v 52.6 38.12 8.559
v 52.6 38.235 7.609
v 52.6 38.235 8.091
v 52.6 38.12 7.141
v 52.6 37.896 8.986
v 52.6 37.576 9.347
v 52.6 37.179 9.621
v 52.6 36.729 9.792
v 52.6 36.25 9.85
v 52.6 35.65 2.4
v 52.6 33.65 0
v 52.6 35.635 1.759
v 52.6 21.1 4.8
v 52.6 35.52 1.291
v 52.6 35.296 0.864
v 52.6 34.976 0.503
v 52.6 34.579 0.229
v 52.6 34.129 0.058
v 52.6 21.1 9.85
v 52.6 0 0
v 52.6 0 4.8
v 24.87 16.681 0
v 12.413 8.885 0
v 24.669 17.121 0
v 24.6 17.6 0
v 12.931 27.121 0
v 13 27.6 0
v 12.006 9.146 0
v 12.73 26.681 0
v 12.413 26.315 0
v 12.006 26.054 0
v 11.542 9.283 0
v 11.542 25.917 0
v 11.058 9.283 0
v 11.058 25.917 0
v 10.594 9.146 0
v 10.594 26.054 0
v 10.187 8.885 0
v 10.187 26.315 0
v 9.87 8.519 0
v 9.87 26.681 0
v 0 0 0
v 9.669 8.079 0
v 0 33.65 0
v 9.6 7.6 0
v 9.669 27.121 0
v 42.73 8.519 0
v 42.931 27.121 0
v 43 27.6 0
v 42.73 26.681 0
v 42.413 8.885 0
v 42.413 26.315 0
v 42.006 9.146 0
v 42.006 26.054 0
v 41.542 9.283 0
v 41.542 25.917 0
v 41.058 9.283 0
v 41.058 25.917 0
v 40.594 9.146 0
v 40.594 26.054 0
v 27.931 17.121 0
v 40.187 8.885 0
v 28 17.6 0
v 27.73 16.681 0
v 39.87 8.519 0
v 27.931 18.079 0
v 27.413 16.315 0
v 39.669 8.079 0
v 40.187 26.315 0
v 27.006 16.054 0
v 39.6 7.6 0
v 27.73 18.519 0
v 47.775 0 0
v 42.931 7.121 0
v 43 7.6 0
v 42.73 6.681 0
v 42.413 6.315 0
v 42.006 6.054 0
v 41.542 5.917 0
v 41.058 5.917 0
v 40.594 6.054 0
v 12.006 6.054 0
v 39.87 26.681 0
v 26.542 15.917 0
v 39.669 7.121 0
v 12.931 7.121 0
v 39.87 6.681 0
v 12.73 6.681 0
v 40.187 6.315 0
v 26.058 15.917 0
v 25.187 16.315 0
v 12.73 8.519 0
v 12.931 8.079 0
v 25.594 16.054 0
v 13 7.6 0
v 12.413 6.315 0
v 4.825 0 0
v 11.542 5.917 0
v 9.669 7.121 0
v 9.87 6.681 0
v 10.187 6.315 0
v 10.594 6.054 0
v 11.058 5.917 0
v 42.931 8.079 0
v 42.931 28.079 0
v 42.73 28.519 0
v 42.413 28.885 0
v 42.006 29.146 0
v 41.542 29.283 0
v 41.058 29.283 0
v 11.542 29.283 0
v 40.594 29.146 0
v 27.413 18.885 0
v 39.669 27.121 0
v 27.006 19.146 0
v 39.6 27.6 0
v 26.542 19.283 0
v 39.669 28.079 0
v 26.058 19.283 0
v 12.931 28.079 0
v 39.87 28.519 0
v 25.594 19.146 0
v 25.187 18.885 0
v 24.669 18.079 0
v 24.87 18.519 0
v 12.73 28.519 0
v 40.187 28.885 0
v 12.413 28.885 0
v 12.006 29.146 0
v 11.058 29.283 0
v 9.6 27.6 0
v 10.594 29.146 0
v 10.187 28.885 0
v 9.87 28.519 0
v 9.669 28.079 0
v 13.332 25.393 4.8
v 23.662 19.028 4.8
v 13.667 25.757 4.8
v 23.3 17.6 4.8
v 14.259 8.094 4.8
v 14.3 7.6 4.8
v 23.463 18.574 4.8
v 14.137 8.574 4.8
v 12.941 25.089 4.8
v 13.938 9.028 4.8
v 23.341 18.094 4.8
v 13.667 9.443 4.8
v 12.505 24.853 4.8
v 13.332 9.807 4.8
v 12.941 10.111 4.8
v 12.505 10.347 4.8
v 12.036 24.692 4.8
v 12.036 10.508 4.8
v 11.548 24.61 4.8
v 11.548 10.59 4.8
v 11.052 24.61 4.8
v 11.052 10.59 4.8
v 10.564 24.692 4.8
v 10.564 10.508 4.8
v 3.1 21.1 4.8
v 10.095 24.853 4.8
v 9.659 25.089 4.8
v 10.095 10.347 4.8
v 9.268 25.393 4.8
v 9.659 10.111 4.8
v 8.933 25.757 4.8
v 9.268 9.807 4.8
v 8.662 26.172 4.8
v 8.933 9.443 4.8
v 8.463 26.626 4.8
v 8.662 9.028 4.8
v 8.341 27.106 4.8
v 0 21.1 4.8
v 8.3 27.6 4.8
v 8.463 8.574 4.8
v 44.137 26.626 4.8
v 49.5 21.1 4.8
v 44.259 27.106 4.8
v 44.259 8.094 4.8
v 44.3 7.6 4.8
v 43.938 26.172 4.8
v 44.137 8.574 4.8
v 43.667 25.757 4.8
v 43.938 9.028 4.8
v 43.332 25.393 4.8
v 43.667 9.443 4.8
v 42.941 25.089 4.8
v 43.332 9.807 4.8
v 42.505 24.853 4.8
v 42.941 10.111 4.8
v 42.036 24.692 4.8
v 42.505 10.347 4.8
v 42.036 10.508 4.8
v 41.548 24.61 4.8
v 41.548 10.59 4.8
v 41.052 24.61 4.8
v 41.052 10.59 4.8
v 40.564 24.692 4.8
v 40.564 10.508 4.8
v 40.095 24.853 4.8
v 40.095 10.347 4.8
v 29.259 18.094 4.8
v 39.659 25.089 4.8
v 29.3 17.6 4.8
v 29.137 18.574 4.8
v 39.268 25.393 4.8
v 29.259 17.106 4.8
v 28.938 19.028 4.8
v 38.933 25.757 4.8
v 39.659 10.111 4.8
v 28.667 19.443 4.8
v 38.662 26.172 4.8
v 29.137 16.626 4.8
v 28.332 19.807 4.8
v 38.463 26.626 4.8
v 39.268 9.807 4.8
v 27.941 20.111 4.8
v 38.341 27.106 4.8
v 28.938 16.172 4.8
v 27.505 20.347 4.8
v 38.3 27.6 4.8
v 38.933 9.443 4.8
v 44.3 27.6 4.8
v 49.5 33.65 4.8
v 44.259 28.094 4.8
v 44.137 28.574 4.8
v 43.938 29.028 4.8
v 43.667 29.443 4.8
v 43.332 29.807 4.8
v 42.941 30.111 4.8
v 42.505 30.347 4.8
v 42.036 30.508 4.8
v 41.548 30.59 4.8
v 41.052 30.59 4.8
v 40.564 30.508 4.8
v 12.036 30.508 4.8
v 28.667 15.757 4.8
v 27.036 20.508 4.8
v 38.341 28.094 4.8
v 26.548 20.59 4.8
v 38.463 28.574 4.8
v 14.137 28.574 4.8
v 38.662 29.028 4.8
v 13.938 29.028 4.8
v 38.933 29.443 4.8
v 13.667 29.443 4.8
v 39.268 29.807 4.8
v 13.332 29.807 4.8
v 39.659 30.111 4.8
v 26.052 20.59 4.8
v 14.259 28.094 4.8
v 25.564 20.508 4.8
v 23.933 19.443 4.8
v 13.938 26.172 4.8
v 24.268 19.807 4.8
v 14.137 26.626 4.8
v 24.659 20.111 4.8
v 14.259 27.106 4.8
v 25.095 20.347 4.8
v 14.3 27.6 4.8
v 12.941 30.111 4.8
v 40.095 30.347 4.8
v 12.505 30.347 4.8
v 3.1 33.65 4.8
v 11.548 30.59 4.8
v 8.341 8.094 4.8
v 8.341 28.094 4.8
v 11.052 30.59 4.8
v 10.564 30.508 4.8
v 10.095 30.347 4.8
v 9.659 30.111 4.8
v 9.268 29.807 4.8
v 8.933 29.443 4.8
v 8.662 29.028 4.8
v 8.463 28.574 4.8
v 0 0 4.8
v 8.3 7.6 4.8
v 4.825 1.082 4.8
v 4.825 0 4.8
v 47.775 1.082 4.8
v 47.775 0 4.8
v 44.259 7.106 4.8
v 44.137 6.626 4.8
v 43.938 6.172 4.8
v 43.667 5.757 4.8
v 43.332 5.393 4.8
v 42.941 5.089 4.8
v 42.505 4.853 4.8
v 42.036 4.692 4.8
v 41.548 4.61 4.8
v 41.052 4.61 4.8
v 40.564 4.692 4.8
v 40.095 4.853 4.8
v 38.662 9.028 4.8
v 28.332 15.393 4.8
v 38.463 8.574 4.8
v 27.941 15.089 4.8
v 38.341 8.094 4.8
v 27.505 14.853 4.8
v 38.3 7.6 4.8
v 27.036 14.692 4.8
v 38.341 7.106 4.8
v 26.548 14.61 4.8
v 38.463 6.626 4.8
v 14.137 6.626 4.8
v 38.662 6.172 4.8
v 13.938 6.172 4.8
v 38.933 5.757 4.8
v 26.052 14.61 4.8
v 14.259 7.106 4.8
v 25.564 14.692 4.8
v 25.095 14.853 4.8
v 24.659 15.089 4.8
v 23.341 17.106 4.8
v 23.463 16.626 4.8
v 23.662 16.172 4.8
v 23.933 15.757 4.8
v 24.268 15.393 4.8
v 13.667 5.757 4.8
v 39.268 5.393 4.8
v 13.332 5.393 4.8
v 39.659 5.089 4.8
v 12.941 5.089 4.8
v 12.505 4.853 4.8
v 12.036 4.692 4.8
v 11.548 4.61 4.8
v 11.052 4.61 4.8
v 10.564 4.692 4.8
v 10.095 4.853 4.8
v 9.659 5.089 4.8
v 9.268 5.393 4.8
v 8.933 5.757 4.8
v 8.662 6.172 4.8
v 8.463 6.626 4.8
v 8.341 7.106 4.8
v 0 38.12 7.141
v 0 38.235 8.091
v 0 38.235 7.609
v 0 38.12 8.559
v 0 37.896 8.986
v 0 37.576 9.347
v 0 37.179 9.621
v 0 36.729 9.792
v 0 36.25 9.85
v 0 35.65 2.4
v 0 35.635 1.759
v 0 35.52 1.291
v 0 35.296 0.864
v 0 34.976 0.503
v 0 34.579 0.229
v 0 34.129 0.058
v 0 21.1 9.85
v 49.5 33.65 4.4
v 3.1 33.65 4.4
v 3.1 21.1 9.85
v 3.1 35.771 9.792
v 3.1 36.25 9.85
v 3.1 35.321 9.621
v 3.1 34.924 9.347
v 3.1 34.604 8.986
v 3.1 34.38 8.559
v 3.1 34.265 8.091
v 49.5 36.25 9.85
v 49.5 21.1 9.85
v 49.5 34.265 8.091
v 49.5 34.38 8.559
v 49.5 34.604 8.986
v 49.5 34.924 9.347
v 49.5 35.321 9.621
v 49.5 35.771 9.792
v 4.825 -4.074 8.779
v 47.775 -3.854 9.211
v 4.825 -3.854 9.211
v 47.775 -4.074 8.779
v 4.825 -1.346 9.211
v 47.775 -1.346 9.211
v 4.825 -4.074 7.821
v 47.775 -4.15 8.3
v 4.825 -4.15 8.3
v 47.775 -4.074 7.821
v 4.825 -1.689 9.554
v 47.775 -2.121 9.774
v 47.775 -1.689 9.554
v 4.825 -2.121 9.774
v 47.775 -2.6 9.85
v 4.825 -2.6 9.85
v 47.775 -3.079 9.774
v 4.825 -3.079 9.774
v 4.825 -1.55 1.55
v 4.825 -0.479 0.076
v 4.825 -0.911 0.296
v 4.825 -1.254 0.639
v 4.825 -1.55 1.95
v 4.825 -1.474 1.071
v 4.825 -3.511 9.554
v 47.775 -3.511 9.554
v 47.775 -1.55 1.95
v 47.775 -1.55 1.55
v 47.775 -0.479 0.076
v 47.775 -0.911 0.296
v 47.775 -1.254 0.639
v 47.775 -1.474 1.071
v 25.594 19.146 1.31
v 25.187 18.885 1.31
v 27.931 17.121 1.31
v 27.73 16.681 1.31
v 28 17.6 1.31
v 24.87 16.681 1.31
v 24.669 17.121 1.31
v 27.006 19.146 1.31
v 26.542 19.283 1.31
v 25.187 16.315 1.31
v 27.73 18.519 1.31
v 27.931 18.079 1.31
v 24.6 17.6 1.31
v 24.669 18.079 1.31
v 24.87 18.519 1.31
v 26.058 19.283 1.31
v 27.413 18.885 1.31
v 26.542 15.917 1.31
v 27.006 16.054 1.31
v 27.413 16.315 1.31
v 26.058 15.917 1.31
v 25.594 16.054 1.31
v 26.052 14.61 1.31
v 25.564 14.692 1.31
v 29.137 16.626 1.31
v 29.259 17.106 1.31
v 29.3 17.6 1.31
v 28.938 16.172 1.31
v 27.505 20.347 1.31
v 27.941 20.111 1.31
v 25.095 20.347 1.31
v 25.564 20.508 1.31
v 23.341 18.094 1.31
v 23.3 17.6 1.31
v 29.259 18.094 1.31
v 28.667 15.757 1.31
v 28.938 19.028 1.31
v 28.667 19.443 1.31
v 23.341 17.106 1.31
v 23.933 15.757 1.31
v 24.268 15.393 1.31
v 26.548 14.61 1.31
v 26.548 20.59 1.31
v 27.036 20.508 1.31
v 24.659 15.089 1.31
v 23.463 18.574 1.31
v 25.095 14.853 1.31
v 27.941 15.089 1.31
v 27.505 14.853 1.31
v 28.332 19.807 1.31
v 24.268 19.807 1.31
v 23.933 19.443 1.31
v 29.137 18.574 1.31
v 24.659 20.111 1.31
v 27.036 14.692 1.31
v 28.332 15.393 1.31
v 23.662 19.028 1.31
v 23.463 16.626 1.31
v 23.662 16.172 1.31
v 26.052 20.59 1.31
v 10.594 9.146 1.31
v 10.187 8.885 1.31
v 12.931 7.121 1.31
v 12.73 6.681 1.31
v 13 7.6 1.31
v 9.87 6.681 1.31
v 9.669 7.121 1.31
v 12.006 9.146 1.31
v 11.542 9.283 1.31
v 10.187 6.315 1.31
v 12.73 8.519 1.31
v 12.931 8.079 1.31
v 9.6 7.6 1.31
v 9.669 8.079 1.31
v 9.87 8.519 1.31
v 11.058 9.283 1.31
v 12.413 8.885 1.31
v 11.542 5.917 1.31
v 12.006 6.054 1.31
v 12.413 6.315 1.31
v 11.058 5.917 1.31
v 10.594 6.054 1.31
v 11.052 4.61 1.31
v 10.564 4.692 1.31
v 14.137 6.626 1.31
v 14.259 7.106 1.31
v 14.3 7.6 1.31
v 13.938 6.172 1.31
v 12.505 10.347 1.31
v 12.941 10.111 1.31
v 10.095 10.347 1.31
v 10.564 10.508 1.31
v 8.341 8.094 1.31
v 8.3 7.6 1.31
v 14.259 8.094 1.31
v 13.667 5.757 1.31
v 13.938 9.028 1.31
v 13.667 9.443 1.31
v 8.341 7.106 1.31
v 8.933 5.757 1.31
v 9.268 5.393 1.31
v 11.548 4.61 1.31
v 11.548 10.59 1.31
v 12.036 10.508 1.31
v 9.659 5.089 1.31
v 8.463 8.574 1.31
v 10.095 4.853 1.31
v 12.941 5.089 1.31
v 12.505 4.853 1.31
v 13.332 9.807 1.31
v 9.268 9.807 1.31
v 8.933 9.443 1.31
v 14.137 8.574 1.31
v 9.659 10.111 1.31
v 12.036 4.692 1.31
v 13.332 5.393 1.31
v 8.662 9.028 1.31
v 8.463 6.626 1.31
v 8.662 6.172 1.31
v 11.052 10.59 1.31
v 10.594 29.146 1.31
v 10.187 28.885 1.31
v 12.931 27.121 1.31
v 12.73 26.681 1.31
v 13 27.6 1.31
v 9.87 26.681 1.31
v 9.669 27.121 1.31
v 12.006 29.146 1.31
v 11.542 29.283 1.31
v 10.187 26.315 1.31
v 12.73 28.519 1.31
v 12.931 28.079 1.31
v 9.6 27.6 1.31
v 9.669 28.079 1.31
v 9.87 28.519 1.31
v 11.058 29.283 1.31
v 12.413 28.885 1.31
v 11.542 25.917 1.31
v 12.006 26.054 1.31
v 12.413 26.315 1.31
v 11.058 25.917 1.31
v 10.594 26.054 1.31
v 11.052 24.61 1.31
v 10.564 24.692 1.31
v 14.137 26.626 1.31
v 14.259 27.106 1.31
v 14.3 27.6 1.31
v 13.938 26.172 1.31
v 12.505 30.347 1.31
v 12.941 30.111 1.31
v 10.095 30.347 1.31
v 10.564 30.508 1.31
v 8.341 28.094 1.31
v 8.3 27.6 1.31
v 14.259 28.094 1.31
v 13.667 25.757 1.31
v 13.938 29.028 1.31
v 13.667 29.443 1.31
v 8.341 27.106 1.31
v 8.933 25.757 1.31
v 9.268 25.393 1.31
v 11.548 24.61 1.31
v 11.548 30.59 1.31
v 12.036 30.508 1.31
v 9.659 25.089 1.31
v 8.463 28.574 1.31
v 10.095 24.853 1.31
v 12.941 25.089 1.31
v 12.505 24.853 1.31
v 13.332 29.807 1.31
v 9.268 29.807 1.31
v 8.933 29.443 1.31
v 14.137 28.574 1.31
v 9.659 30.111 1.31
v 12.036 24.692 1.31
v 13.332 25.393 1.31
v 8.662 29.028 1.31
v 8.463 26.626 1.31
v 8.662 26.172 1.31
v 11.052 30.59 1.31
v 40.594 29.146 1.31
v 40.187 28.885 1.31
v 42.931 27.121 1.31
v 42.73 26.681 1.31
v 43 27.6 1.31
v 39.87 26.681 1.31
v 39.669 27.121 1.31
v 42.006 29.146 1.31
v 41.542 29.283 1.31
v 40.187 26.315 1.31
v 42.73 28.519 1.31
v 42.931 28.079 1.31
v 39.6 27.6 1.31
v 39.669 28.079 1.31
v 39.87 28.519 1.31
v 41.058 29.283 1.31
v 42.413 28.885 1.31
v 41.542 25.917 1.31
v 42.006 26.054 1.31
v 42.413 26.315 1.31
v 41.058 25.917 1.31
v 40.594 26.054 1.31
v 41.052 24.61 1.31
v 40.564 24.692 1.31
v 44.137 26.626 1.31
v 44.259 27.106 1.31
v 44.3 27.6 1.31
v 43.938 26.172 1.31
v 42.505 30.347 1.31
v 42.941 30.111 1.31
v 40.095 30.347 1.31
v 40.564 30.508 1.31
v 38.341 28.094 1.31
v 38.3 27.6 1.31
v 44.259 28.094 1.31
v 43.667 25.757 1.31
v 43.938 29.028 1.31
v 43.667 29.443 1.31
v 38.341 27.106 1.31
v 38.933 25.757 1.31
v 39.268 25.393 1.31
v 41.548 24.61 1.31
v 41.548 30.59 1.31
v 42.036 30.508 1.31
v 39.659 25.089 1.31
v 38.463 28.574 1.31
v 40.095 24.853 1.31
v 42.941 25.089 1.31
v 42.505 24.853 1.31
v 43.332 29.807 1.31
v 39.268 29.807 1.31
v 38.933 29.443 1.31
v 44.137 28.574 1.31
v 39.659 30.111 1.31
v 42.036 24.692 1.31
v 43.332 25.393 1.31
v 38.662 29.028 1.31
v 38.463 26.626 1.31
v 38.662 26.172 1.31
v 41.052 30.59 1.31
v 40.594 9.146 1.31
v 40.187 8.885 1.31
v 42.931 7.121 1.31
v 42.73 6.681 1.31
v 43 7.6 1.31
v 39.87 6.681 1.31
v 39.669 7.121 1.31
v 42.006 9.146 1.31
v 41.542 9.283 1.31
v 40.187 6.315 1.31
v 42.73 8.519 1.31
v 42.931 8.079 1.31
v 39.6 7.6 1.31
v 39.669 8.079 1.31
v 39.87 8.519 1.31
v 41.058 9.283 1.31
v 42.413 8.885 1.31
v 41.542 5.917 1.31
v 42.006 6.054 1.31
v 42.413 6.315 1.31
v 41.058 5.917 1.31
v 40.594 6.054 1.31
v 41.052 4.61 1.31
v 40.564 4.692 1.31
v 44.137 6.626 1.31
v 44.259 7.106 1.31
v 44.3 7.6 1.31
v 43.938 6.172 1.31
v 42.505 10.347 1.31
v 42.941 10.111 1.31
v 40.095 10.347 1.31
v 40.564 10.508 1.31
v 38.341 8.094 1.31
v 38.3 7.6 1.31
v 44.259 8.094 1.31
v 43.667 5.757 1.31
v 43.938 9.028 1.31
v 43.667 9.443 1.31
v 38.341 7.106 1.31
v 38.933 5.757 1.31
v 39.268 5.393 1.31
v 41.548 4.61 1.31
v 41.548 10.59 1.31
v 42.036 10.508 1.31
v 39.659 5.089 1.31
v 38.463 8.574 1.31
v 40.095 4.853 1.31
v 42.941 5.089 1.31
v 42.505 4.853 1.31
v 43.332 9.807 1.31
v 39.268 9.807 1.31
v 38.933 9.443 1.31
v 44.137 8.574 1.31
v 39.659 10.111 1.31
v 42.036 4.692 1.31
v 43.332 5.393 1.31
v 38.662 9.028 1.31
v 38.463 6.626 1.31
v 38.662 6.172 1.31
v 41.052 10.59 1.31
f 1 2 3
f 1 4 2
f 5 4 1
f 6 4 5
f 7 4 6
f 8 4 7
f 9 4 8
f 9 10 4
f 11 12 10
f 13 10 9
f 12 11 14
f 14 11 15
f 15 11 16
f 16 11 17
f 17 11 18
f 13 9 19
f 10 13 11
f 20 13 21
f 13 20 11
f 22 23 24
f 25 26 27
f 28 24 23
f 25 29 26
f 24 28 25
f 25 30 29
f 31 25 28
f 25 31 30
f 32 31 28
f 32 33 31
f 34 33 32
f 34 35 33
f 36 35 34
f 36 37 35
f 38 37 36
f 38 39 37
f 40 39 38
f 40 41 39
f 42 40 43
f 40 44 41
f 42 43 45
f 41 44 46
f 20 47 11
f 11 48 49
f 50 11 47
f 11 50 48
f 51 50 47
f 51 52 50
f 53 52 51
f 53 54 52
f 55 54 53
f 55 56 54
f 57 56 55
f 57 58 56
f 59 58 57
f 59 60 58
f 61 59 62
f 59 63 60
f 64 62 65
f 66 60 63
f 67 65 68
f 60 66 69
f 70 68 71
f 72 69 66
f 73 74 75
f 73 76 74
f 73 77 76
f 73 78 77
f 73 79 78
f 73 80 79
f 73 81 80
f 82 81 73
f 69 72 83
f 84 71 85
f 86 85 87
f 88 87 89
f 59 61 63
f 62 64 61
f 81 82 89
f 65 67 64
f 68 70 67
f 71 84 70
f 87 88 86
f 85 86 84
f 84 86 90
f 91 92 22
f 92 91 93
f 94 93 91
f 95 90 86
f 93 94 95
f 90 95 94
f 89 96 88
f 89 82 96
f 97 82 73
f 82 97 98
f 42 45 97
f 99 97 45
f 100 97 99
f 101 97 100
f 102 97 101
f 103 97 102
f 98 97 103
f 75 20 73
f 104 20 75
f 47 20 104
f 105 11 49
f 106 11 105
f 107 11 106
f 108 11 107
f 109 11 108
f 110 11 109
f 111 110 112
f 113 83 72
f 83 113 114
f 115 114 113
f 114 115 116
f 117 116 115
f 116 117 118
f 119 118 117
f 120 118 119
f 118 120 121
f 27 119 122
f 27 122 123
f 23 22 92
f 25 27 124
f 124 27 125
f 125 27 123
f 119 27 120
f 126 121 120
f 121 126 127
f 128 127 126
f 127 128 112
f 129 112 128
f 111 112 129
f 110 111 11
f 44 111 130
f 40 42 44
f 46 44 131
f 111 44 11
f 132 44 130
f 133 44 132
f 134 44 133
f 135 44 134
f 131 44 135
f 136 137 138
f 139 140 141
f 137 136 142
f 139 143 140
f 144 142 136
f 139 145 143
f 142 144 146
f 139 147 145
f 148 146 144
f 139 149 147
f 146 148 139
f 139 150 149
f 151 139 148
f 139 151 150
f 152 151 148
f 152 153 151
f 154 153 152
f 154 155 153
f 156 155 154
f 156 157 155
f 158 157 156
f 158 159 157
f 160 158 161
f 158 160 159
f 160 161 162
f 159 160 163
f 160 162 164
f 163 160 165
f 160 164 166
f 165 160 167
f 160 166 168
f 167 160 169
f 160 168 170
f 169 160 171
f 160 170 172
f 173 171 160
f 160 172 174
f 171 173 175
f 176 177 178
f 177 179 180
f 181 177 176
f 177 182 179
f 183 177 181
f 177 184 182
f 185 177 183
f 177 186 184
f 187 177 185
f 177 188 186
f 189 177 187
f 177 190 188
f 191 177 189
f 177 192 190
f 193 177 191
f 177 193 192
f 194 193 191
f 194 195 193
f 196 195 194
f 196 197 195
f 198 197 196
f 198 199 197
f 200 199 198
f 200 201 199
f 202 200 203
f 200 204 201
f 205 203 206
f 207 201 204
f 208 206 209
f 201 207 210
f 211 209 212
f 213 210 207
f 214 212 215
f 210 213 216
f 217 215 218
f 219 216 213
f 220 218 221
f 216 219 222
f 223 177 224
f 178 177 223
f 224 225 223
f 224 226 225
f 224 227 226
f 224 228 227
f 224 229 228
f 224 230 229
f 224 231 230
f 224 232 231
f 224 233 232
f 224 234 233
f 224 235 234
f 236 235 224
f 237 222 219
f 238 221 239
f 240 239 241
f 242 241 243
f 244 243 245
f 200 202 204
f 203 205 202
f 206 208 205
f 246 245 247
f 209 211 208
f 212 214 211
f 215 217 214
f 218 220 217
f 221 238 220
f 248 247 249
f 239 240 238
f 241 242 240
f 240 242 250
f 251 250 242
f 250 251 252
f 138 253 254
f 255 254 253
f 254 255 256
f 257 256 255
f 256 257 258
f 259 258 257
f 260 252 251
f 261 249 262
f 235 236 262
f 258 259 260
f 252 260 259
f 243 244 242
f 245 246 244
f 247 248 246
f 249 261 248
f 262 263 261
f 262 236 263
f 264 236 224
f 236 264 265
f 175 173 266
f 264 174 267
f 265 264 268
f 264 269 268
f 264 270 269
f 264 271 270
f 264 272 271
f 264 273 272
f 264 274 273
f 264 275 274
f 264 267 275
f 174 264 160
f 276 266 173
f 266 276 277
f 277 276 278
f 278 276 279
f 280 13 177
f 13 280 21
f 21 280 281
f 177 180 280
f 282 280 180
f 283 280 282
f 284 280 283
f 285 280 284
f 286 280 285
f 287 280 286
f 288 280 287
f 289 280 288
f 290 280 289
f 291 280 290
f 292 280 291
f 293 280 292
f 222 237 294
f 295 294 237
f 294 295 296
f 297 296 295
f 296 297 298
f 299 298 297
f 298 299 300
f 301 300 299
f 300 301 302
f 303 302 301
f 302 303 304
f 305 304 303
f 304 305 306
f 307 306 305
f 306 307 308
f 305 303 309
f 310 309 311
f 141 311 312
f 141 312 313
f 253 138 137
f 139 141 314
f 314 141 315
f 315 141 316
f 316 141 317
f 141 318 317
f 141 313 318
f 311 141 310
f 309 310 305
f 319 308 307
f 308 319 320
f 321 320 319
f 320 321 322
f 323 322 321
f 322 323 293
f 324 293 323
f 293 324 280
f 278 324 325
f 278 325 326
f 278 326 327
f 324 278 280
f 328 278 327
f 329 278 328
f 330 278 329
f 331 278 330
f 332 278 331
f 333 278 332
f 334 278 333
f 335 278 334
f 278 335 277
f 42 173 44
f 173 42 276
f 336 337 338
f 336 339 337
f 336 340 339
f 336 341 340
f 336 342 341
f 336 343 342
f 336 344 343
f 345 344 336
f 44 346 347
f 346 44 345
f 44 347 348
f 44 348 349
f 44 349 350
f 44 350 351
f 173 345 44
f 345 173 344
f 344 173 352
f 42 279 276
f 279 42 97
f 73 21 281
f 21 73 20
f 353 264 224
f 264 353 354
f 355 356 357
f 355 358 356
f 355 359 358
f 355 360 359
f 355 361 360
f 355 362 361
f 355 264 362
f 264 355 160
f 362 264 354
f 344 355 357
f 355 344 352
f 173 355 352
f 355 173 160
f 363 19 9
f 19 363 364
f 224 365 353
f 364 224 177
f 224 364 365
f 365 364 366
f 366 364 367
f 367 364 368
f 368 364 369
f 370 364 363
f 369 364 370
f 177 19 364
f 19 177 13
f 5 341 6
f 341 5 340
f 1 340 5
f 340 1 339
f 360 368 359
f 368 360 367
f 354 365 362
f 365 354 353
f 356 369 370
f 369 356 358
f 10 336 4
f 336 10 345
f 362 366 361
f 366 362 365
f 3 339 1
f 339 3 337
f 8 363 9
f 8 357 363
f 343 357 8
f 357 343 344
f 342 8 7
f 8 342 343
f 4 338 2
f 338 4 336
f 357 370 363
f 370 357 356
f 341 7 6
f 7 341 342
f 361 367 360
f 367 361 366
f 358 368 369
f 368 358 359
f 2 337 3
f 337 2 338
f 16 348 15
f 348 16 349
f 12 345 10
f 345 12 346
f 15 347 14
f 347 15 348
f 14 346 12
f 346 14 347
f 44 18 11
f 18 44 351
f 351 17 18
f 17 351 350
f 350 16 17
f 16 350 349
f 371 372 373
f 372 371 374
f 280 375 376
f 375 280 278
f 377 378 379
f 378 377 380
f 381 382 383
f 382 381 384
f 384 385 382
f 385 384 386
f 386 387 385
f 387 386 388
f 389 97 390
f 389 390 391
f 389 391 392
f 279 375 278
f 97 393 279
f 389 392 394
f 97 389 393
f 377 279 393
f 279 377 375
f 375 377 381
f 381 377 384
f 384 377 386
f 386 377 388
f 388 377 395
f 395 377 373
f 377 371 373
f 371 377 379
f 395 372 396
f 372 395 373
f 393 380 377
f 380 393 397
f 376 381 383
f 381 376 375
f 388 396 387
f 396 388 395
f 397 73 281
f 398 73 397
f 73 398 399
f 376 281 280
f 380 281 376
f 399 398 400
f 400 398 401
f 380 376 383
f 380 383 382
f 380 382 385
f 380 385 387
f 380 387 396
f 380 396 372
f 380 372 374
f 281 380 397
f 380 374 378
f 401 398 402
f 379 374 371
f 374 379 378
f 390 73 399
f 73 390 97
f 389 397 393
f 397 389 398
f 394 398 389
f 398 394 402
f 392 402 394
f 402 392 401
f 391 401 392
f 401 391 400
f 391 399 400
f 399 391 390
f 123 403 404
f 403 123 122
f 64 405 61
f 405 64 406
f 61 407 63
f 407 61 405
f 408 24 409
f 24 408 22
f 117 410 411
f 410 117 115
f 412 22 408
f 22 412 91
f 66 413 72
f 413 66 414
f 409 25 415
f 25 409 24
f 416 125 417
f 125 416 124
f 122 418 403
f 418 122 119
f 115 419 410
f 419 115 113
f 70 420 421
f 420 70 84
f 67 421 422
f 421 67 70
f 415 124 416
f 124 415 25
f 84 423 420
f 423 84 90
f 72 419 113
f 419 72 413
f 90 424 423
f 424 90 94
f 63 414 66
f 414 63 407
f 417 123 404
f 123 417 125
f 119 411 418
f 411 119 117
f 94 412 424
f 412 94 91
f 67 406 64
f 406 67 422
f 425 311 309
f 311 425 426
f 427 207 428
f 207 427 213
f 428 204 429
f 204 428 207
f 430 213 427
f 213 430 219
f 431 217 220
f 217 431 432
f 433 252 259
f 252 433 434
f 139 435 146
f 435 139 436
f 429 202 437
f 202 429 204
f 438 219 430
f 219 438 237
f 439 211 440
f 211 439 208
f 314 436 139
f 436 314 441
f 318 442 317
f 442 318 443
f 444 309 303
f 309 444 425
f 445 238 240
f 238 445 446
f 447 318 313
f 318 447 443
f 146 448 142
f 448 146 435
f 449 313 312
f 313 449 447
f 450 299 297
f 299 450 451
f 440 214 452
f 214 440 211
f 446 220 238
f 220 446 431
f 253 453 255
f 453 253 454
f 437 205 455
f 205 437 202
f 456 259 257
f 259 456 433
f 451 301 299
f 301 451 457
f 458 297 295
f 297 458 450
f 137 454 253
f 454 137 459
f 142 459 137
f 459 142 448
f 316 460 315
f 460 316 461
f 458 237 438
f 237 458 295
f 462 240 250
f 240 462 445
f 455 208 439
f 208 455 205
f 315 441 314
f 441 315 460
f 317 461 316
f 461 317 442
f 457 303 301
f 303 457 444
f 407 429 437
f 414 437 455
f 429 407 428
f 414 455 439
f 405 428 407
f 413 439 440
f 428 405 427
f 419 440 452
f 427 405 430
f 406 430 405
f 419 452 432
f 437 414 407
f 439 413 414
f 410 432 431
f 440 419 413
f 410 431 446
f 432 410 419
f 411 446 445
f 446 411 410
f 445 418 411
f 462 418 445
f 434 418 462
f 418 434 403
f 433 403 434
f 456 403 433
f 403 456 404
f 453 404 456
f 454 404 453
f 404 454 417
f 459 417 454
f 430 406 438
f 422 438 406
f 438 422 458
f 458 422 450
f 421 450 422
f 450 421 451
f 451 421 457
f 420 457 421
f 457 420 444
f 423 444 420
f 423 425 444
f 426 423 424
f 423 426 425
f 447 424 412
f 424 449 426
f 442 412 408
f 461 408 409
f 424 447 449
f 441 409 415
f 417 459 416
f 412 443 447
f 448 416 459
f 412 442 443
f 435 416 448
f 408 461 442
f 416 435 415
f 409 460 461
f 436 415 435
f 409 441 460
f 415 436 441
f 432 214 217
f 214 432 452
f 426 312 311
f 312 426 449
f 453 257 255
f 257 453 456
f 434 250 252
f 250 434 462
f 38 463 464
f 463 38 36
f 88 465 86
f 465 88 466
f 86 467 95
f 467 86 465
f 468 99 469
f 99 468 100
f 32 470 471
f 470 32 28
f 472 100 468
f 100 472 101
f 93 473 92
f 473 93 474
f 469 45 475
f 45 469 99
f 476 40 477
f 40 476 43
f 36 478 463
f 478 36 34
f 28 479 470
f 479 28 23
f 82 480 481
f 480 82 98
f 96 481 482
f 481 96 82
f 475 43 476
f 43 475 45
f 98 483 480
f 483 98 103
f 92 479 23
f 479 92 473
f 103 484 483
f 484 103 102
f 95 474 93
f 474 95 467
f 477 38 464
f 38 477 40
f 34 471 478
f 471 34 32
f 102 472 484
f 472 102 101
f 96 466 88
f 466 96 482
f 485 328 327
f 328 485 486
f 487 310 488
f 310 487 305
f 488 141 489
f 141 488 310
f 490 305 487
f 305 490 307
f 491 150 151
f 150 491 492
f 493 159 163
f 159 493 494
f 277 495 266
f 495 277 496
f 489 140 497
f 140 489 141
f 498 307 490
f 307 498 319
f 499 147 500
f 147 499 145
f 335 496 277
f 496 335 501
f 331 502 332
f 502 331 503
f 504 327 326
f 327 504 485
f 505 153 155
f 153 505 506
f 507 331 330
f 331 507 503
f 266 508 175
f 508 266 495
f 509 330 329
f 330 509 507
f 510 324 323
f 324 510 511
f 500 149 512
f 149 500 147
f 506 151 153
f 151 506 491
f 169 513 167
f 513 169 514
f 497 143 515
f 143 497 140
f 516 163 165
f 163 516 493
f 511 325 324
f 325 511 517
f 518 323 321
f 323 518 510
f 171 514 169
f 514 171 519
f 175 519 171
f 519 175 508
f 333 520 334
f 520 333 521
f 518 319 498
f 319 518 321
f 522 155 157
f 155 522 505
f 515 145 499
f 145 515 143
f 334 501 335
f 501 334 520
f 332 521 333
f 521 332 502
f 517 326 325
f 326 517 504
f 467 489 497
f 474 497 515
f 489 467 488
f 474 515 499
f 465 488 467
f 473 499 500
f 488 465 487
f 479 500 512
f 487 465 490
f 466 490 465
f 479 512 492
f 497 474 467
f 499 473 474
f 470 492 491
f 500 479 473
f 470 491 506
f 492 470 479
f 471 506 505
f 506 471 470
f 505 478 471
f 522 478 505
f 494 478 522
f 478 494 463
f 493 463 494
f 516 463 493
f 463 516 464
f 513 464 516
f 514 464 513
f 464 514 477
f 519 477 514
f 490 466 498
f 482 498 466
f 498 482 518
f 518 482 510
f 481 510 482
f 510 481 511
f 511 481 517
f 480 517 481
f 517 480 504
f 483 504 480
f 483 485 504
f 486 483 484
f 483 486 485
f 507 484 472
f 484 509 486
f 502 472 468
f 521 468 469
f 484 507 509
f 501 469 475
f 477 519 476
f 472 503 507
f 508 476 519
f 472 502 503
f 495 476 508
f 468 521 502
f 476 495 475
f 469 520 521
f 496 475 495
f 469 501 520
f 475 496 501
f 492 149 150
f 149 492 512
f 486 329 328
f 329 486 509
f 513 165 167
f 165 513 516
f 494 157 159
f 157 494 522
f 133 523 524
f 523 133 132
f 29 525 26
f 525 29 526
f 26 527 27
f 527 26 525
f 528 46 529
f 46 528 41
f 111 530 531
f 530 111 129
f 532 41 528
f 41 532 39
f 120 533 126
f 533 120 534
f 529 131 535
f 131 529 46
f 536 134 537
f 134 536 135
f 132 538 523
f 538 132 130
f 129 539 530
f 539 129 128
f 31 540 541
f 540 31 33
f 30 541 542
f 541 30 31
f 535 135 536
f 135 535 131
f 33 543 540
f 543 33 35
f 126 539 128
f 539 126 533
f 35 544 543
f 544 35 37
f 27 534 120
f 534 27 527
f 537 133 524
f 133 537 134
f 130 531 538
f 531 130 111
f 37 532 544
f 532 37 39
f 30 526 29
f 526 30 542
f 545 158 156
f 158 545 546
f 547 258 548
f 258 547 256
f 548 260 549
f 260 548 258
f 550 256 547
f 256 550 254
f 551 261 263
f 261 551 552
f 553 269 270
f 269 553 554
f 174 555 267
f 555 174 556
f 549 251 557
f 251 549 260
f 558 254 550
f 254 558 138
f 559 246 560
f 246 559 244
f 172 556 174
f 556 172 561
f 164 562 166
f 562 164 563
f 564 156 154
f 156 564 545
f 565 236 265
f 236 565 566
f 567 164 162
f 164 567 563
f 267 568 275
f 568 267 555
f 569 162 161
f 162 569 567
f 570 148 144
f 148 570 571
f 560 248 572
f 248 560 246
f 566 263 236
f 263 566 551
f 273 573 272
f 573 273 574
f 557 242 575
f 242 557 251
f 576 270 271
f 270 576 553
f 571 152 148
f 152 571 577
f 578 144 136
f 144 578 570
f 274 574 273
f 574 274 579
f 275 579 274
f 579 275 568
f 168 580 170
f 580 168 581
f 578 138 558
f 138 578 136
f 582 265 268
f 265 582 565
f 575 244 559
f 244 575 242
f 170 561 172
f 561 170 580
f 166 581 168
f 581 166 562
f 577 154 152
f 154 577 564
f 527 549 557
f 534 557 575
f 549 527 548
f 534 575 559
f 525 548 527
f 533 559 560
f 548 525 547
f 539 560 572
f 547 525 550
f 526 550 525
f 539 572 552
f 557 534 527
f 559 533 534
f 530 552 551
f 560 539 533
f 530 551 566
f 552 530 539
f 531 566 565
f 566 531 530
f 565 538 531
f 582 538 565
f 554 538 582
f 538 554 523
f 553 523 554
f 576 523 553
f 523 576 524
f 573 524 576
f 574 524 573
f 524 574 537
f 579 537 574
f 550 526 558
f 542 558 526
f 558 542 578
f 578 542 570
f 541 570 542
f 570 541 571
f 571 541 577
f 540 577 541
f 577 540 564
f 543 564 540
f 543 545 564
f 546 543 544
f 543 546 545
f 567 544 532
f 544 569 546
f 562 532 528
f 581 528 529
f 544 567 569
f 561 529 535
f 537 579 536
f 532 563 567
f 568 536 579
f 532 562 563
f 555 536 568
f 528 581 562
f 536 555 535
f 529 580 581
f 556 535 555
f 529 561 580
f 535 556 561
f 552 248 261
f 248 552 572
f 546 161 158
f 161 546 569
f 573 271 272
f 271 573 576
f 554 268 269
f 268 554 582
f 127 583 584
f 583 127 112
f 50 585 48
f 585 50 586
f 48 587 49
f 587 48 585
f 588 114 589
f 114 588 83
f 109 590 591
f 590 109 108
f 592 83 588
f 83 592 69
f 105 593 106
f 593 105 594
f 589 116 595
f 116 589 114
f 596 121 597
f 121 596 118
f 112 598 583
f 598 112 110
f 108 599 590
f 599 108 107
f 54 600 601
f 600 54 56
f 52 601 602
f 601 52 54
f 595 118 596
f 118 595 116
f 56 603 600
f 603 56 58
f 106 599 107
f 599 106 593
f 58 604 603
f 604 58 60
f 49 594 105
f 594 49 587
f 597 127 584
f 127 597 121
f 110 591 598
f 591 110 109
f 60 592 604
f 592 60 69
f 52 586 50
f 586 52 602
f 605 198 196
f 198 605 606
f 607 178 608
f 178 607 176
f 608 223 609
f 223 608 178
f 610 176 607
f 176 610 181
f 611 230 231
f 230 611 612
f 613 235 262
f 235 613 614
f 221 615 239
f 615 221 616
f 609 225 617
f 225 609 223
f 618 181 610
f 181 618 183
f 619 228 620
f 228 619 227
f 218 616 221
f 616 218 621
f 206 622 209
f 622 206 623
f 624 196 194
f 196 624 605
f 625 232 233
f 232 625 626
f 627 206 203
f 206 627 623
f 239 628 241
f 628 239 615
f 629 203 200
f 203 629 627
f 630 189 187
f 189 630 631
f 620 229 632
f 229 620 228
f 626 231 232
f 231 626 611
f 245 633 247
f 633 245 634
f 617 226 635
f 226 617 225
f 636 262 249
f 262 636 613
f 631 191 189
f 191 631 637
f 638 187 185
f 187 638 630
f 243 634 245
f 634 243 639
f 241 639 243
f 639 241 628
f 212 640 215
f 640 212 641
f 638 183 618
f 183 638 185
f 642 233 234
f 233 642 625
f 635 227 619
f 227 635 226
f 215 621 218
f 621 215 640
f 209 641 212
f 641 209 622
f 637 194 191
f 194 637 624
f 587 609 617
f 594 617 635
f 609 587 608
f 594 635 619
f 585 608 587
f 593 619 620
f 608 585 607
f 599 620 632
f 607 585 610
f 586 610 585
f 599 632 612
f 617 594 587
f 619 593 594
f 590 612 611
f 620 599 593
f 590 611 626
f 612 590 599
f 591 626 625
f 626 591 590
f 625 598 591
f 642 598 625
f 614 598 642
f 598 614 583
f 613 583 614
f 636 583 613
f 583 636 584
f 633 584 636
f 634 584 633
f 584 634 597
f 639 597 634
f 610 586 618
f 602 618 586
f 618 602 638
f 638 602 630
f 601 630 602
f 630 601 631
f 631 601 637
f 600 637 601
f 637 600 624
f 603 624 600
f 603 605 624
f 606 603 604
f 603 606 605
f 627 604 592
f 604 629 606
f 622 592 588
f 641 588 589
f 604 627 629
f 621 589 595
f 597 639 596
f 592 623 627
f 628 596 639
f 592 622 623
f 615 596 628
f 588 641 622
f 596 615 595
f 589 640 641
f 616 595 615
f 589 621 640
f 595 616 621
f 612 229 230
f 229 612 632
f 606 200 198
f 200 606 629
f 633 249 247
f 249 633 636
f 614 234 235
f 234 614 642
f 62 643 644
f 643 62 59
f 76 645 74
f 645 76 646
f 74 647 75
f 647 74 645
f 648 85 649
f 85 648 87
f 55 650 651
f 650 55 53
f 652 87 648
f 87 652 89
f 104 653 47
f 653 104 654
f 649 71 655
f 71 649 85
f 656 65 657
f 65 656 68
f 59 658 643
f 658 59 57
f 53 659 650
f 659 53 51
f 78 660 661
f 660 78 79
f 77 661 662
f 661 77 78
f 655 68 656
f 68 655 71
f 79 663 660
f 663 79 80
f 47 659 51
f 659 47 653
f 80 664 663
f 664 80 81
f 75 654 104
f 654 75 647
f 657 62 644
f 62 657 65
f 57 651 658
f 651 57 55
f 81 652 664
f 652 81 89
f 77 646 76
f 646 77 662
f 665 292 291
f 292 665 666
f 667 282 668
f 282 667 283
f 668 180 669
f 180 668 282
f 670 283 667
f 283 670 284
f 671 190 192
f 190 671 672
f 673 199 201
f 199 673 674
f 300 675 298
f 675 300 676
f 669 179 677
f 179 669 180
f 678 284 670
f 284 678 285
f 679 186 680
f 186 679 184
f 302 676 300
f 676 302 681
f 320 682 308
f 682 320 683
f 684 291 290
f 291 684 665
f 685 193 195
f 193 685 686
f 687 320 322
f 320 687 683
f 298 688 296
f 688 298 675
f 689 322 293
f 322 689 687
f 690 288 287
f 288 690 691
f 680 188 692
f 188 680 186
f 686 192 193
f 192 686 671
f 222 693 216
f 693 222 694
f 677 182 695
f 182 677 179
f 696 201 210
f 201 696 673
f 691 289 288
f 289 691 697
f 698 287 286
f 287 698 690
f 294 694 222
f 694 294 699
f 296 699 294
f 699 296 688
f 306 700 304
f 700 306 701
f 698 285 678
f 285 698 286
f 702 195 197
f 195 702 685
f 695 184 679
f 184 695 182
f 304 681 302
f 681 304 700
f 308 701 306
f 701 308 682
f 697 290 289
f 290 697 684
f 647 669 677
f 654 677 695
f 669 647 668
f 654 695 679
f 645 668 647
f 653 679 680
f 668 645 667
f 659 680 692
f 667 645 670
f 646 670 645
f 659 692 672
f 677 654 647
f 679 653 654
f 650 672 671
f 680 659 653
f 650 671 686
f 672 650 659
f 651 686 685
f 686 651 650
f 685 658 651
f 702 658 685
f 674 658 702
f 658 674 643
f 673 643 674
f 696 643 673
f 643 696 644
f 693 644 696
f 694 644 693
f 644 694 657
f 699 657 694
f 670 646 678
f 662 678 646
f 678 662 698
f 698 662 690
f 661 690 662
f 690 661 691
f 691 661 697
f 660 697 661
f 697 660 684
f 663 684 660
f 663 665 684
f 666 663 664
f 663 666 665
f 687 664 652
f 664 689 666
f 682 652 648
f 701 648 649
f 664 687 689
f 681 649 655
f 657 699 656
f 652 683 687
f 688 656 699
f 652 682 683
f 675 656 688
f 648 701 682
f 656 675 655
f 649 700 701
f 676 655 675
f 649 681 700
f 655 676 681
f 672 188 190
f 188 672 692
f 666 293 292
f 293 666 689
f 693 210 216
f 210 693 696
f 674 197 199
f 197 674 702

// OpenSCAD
$fa=5; // default minimum facet angle is now 0.5°
$fs=0.5; // default minimum facet size is now 0.5 mm

//top plate
tpx = 52.6;
tpy = 47.6-5.2;
tpz = 6.3-1.5;

//base plate;
bpx = tpx;
bpy = tpy-5.2;// 42.4;
bpz = 9.85;

//front lip
flx = 42.95;
fly = 4.2;
flz = 5.1;
fd = 3.1;
flo = 2.4;

//back lip
blx = tpx;
bly = 16.7;
blz = bpz - tpz;

//backlip diameter
bd = 4;

//back lip z offset from top
blo = 2.4;

*union()
{
  cube([tpx,tpy,tpz]);
  translate([0,-(bpy-tpy)/2,0])
  cube([bpx,bpy,bpz]);
}

difference()
{
  translate([0,tpy-((tpy-bpy)/2)-fd/2,bpz])
    rotate([180,0,0])
      plate();
  
  translate([0,-1,0])
  {
    translate([bpx/2,bpy/2,0])
      r_screwhole();

    translate([bpx/2-15,bpy/2-10,0]) r_screwhole();
    translate([bpx/2-15,bpy/2+10,0]) r_screwhole();
    translate([bpx/2+15,bpy/2+10,0]) r_screwhole();
    translate([bpx/2+15,bpy/2-10,0]) r_screwhole();
  }
}

module plate()
{
  translate([0,(tpy-bpy)/2+bd/2,bpz-tpz])
    cube([bpx,bpy-fd/2-bd/2,tpz]);

  translate([0,bd/2,0])
    cube([fd,bly-fd/2,6]);

  translate([tpx-fd,bd/2,0])
    cube([fd,bly-fd/2,6]);

  hull()
  {
    translate([0,bd/2,bd/2])
      rotate([0,90,0])
        cylinder(d=bd,h=blx);

    translate([0,(tpy-bpy)/2,bpz-blo-bd/2])
      cube([blx,bd/2,bd/2]);
  }

  hull()
  {
    translate([0,(tpy-bpy)/2,bpz-blo-bd/2])
      cube([blx,bd/2,bd/2]);

    translate([0,bd/2+(tpy-bpy)/2,bpz-bd/2])
      rotate([0,90,0])
        cylinder(d=bd,h=blx);
  }

  hull()
  {
    translate([(blx-flx)/2,tpy-fd/2,fd/2])
      rotate([0,90,0])
        cylinder(d=fd,h=flx);

    translate([(blx-flx)/2,tpy-fd-(tpy-bpy)/2,bpz-fd/2-flo])
      cube([flx,fd,bd/2]);  
  }

  hull()
  {
    translate([(blx-flx)/2,tpy-fd-(tpy-bpy)/2,bpz-fd/2-flo])
      cube([flx,fd,bd/2]);

    translate([(blx-flx)/2,tpy-fd/2-(tpy-bpy)/2,bpz-fd/2])
      rotate([0,90,0])
        cylinder(d=fd,h=flx);
  }
}

module r_screwhole()
{
  translate([0,0,tpz])
    rotate([180,0,0])
      screwhole(tpz);
}

module screwhole(wz,hz=3.5)
{
  M3 = 3.4;
  M3h = 6;
  
  cylinder(d=M3,h=wz+1);
  
  translate([0,0,-0.01])
    cylinder(d=M3h,h=hz);
}
